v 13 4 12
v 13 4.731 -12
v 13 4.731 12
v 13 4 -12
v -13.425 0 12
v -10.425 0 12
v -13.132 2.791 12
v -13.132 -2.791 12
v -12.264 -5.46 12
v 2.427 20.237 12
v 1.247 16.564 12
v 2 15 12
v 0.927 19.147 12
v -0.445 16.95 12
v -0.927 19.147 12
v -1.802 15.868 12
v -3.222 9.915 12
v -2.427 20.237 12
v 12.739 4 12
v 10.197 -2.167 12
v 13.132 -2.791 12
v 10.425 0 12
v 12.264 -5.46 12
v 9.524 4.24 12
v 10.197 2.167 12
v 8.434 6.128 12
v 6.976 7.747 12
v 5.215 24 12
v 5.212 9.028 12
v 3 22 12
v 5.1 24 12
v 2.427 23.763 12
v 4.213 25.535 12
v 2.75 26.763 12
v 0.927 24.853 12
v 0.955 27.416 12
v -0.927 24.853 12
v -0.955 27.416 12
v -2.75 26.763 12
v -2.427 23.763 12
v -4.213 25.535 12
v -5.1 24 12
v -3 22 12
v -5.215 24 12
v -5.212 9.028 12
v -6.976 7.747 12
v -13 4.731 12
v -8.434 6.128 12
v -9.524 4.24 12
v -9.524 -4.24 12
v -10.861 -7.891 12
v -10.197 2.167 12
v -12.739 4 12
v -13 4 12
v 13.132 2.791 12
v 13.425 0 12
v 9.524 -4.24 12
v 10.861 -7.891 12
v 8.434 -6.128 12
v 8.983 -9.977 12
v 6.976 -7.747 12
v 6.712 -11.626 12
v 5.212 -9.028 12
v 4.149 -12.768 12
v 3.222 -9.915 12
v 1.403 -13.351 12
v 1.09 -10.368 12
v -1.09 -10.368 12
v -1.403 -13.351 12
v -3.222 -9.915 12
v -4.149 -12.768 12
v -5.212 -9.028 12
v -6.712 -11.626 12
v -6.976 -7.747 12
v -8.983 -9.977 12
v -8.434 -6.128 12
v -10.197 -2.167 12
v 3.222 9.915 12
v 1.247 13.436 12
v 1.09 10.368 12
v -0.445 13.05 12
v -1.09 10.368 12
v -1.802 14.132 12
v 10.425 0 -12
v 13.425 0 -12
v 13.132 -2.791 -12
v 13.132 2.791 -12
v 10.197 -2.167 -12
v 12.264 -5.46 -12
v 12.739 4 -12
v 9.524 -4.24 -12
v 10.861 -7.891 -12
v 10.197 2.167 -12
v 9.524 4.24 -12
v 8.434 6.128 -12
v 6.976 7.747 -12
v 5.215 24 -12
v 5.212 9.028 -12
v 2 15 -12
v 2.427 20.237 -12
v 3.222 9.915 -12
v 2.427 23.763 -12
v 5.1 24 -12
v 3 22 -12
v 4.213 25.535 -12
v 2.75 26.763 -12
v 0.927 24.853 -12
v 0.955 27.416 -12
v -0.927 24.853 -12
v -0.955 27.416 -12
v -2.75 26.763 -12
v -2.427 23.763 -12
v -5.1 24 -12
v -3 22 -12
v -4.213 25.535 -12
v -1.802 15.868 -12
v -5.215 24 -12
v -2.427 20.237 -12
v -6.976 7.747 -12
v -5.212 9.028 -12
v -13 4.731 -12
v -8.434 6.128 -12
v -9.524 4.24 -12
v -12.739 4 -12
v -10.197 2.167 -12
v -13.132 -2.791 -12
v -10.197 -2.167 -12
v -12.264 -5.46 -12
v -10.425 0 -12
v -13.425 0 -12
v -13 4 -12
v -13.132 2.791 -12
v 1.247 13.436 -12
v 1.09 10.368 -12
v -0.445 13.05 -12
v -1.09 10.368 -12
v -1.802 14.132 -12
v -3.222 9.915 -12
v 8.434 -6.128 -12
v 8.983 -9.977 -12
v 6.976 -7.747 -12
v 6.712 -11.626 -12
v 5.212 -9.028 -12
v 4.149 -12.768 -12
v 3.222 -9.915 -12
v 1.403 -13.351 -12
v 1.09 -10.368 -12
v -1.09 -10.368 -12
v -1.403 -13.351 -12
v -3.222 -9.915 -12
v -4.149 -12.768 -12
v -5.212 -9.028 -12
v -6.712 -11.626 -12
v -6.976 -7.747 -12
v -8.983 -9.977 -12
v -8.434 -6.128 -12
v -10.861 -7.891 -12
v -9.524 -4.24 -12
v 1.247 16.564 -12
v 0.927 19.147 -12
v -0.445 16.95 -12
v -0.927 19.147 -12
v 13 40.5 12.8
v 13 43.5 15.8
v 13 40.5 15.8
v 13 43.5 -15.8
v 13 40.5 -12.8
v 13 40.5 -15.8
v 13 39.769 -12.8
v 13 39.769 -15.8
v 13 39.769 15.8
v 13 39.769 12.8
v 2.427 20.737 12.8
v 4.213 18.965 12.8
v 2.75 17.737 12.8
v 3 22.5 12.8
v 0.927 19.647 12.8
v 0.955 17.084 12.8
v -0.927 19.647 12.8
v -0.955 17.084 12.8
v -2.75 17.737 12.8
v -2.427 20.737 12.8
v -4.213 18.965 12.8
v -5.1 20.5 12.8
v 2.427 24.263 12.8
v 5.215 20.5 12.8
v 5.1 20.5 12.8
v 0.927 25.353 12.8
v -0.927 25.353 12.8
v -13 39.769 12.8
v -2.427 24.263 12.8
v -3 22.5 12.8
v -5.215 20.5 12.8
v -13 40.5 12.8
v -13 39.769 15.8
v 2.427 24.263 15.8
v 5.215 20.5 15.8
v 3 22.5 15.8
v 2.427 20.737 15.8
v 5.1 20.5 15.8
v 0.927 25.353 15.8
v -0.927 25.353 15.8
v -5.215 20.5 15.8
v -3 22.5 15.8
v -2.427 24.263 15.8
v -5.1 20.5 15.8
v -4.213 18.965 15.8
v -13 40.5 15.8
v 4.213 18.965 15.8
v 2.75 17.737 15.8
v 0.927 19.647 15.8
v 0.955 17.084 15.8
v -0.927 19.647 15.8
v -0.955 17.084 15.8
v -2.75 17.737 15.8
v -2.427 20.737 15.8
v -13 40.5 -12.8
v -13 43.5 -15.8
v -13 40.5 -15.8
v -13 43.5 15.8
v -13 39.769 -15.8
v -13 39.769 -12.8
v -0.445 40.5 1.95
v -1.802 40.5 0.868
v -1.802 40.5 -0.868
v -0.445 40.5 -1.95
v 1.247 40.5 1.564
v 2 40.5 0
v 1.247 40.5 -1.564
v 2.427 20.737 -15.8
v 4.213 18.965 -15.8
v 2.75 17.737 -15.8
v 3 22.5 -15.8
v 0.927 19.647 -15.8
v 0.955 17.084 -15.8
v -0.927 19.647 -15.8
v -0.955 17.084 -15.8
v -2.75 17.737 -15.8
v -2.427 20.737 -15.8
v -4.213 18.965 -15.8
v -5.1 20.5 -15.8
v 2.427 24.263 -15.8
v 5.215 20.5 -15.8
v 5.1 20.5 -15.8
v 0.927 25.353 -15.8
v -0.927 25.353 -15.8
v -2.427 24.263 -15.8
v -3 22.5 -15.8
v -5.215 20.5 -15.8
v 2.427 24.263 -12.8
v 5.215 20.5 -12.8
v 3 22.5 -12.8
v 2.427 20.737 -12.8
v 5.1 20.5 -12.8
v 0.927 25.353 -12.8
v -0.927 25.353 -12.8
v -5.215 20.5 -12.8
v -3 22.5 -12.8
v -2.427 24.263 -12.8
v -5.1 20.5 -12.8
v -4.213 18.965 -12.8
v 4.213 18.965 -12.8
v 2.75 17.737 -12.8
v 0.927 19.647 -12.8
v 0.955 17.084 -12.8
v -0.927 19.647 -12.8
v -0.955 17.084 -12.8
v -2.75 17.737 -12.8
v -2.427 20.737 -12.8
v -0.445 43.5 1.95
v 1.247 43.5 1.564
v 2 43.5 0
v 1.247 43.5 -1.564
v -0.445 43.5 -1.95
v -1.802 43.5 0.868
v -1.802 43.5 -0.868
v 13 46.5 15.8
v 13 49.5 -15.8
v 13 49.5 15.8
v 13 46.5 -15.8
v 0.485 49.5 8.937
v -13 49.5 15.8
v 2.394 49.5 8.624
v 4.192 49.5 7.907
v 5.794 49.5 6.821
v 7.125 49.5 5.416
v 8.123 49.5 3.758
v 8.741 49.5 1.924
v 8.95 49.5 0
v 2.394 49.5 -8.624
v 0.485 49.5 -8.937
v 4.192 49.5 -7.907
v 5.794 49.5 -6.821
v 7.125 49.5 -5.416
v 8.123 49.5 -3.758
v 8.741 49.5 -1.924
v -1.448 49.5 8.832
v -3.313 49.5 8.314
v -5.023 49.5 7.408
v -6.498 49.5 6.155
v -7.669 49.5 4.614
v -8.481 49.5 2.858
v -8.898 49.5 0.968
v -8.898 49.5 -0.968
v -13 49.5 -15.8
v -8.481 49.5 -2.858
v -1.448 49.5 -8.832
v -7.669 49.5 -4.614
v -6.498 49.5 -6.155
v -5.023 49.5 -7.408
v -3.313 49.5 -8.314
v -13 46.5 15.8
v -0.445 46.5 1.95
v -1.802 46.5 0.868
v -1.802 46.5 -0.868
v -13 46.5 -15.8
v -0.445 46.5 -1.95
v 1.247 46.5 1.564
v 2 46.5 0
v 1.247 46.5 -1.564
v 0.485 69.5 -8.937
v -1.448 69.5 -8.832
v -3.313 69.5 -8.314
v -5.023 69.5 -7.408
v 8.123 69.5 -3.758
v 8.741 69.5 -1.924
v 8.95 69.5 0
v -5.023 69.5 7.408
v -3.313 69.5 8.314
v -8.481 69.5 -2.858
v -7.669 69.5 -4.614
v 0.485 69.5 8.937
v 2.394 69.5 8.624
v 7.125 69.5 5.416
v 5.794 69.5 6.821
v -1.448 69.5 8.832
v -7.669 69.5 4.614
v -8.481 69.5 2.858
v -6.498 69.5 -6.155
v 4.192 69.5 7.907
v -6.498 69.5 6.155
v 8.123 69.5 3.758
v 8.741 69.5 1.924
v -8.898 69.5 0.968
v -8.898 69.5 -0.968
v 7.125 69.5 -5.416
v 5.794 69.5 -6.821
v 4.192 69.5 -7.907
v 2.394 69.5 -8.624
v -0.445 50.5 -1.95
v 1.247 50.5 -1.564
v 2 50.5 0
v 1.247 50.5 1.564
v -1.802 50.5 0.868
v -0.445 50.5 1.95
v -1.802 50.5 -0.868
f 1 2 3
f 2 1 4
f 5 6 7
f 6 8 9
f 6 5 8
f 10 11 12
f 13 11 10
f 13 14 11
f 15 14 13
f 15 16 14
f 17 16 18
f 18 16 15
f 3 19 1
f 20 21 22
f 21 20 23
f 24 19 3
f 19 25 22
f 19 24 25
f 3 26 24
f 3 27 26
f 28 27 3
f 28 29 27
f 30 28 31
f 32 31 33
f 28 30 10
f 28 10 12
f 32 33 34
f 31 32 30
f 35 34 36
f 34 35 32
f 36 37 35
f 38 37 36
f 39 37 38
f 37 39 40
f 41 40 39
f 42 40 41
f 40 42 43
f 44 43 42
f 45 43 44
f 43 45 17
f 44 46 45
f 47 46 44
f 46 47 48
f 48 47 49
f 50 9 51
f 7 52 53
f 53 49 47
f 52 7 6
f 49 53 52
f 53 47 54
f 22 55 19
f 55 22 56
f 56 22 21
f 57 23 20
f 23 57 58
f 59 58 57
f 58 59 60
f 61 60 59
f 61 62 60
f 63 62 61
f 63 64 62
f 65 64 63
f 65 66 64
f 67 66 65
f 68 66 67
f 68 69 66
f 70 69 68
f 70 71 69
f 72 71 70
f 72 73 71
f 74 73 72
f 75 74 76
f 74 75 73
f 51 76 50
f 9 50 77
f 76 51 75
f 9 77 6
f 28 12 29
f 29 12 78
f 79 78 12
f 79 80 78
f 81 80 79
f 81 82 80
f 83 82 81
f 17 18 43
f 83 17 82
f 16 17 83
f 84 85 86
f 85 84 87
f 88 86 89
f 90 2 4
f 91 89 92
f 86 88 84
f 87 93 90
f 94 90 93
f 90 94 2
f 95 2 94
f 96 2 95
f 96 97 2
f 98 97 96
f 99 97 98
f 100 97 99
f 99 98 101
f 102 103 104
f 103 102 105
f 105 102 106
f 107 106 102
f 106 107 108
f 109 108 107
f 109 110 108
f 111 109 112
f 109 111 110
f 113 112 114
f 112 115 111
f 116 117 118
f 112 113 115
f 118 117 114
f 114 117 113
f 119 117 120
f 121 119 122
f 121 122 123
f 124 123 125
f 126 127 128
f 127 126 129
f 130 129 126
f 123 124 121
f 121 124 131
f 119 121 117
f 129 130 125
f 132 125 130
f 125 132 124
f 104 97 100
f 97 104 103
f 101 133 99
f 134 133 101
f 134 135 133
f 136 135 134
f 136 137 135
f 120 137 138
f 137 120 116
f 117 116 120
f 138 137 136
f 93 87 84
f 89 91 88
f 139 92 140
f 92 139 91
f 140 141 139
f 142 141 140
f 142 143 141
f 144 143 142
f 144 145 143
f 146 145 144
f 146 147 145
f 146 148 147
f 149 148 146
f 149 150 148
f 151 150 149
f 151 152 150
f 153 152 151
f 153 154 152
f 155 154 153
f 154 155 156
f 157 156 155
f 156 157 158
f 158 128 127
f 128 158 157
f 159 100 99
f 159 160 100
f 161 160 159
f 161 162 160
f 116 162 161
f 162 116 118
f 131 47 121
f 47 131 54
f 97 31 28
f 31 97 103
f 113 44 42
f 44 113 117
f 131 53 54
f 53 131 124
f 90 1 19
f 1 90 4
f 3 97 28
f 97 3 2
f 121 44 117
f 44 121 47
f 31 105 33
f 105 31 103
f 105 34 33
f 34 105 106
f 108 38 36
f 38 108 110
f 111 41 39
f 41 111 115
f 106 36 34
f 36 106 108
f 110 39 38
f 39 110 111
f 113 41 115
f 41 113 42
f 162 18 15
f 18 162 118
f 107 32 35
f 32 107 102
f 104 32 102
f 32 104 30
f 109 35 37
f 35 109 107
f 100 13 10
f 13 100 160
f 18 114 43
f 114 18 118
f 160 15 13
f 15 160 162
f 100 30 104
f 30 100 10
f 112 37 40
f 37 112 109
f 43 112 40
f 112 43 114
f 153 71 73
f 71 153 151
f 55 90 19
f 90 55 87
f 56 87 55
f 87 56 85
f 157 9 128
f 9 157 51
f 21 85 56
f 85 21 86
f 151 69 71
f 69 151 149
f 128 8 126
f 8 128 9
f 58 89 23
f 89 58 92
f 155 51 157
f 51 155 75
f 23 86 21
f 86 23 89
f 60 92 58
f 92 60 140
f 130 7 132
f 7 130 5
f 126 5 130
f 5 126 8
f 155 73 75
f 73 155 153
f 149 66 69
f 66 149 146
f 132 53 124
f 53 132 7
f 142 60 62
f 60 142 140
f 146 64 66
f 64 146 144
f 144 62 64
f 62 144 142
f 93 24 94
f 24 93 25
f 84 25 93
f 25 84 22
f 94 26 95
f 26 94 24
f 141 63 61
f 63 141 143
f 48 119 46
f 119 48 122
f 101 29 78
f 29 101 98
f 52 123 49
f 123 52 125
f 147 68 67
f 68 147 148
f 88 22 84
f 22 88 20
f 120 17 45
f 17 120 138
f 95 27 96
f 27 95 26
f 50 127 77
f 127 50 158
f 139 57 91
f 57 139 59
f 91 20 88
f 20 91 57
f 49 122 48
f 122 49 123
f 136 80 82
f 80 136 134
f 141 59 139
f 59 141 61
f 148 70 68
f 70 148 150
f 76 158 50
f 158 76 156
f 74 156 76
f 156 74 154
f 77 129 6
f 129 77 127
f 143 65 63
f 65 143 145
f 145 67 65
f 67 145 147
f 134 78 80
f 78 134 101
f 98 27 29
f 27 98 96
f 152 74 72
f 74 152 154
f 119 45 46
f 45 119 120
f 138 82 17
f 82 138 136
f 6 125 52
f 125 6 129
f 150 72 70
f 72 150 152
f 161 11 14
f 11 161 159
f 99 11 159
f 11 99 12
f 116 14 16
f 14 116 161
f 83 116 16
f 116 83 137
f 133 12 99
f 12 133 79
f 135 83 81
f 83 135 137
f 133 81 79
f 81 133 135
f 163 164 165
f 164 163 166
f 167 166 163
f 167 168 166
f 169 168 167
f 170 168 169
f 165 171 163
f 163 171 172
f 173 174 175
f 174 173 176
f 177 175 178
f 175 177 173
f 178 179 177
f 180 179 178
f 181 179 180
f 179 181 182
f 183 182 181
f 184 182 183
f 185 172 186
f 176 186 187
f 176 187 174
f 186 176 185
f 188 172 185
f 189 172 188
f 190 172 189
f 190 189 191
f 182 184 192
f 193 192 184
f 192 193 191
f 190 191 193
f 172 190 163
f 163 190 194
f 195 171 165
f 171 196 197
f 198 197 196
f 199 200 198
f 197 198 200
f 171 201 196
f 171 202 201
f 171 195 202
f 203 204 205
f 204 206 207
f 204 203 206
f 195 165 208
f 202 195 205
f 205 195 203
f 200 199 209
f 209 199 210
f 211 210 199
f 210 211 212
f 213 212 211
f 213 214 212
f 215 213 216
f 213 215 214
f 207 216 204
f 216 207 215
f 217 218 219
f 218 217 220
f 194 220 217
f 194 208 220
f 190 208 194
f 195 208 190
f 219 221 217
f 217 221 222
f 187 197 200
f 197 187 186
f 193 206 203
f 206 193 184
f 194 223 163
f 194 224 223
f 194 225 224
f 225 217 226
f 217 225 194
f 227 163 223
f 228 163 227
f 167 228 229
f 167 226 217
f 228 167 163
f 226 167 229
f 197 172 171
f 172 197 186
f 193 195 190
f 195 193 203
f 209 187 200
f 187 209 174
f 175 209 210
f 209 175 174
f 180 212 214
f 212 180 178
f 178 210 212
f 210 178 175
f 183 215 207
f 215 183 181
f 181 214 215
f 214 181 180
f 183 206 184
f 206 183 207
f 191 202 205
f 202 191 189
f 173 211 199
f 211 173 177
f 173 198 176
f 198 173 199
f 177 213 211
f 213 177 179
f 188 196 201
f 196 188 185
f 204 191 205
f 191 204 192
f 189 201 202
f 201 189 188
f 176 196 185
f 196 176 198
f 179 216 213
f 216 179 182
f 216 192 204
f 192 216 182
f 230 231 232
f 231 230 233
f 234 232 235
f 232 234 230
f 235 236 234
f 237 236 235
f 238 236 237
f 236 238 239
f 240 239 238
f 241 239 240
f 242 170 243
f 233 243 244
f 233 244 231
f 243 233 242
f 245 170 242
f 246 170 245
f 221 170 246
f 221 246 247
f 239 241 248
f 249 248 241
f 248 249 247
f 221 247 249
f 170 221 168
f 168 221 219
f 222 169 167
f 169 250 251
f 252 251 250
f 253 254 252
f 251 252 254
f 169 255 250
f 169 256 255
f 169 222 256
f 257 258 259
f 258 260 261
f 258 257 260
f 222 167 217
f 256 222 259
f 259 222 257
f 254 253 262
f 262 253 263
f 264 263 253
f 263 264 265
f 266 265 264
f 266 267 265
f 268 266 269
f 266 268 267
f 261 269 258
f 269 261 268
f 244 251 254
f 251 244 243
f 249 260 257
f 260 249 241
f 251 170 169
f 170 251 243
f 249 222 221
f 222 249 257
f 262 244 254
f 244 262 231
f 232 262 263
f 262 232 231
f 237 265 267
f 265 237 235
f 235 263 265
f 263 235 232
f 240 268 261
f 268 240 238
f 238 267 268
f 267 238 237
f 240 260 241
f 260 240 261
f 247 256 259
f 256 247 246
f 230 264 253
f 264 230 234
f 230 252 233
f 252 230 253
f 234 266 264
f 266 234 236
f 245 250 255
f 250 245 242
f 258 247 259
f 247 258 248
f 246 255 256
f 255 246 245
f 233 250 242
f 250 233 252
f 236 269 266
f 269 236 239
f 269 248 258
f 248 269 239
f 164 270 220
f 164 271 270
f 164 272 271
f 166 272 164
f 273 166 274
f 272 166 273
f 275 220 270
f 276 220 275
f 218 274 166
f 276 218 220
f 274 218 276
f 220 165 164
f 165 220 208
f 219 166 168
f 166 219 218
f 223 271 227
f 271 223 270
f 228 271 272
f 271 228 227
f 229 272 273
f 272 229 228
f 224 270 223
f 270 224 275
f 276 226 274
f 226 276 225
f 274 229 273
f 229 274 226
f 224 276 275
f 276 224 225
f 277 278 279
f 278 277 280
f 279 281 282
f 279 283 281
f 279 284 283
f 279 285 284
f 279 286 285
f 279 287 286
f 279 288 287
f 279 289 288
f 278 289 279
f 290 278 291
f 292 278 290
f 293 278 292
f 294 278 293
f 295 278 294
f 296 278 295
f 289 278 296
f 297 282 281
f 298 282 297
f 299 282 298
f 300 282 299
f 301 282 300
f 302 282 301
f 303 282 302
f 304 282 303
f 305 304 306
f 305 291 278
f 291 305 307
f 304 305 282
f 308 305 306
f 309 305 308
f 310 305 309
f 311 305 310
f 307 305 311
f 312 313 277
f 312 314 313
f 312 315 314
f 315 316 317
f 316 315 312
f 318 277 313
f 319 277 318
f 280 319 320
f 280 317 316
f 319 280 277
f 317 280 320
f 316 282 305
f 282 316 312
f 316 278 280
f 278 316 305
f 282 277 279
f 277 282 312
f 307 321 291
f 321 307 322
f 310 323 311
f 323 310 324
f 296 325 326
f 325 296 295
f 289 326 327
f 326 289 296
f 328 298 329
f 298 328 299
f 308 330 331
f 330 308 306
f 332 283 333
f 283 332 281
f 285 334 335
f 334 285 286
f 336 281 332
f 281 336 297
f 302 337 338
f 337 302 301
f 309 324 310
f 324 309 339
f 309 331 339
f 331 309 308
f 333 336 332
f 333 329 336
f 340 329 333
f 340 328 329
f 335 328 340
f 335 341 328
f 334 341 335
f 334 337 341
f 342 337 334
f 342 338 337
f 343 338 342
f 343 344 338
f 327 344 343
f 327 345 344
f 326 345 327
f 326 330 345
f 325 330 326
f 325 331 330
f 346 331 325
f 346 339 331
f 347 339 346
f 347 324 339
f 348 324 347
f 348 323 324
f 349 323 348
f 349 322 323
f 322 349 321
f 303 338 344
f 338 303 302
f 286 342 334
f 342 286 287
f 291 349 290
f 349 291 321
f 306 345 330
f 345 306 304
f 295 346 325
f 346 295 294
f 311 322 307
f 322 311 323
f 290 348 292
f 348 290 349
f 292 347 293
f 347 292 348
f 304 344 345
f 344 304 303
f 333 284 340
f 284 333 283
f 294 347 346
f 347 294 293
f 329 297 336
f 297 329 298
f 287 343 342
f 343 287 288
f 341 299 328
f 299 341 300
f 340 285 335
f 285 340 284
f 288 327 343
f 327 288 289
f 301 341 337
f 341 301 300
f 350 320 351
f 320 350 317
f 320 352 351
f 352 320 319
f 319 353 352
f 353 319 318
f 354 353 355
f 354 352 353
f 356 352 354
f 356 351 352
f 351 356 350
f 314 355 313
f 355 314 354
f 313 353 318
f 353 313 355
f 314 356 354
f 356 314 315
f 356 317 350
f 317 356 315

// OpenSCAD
// file: constants.scad
/*
 * Written by Dermot Tynan, Kalopa Research.
 * GPLv2.
 *
 * This file has all the constants for the OpenWing sail.
 *
 * All dimensions are in mm.
 */
wall_thickness = 3;

cf_mast_outer_dia = 20.85;
cf_mast_inner_dia = 17.90;
cf_mast_insert_len = 20;

mast_cap_dia = 24;
mast_cap_height = 16;
mast_base_x = 24;
mast_base_y = 24;
mast_base_height = 12;
mast_base_grip_off = 8;
mast_base_grip_dia = 3.2;

gooseneck_height = 24;
gooseneck_len = 20;
gooseneck_barrel_dia = 11;
gooseplate_width = 26;

kicker_ring_dia = 18;

attach_pin_dia = 6;
washer_thickness = 0.8;
rigging_line_dia = 4;
// main file
/*
 * Written by Dermot Tynan, Kalopa Research.
 * GPLv2.
 *
 * This is the definition for the five mast supports on the upper
 * leading-edge of the mast, A8 -> A12.
 *
 * All dimensions are in mm.
 */

include <constants.scad>

module att_wedge(height)
{
	difference() {
		cube([26, gooseneck_len, height], center = true);
		translate([16, 10, 0]) rotate([0, 0, 22])
			cube([20, 50, 30], center = true);
		translate([-16, 10, 0]) rotate([0, 0, -22])
			cube([20, 50, 30], center = true);
	}

}

module attachment(height)
{
	difference() {
		union() {
			att_wedge(height);
			translate([0, gooseneck_len * 0.4, 0])
				cylinder(r = gooseneck_barrel_dia/2, h = height, center = true);
		}
	 	translate([0, gooseneck_len * 0.4, 0])
	 		cylinder(r = attach_pin_dia/2, h = height + 2, center = true);
	}
}

module gooseneck()
{
 	difference() {
 		union() {
			cylinder(r = cf_mast_outer_dia/2 + wall_thickness, h = gooseneck_height, center = true);
			translate([0, 14, 0])
				attachment(gooseneck_height);
		}
	 	cylinder(r = cf_mast_outer_dia/2, h = gooseneck_height + 2, center = true);
	 	translate([0, 15, 0])
	 		cylinder(r = rigging_line_dia/2, h = gooseneck_height + 2, center = true);
	}
}

module goose_attach()
{
	h = gooseneck_height + (washer_thickness + wall_thickness) * 2;
	d = (gooseneck_height + wall_thickness) / 2 + washer_thickness;
	l = (gooseneck_len + wall_thickness) / 2;
	difference() {
		union() {
			cube([gooseplate_width, h, wall_thickness], center = true);
			translate([0, d, l]) rotate([90, 0, 0])
				attachment(wall_thickness);
			translate([0, -d, l]) rotate([90, 0, 0])
				attachment(wall_thickness);
		}
		cylinder(r = 4/2, h = wall_thickness + 2, center = true);
	}
}

module boom_attach()
{
	h = gooseneck_height + (washer_thickness + wall_thickness) * 2;
	difference() {
		union() {
			cube([gooseplate_width, h, wall_thickness], center = true);
			translate([0, 0, (wall_thickness + cf_mast_insert_len)/2])
				cylinder(r = cf_mast_inner_dia/2, h = cf_mast_insert_len, center = true);
		}
		cylinder(r = 4/2, h = wall_thickness + 2, center = true);
	}
}

gooseneck();
translate([0, 42, 0]) rotate([90, 0, 0]) goose_attach();
translate([0, 48, 0]) rotate([-90, 0, 0]) boom_attach();
